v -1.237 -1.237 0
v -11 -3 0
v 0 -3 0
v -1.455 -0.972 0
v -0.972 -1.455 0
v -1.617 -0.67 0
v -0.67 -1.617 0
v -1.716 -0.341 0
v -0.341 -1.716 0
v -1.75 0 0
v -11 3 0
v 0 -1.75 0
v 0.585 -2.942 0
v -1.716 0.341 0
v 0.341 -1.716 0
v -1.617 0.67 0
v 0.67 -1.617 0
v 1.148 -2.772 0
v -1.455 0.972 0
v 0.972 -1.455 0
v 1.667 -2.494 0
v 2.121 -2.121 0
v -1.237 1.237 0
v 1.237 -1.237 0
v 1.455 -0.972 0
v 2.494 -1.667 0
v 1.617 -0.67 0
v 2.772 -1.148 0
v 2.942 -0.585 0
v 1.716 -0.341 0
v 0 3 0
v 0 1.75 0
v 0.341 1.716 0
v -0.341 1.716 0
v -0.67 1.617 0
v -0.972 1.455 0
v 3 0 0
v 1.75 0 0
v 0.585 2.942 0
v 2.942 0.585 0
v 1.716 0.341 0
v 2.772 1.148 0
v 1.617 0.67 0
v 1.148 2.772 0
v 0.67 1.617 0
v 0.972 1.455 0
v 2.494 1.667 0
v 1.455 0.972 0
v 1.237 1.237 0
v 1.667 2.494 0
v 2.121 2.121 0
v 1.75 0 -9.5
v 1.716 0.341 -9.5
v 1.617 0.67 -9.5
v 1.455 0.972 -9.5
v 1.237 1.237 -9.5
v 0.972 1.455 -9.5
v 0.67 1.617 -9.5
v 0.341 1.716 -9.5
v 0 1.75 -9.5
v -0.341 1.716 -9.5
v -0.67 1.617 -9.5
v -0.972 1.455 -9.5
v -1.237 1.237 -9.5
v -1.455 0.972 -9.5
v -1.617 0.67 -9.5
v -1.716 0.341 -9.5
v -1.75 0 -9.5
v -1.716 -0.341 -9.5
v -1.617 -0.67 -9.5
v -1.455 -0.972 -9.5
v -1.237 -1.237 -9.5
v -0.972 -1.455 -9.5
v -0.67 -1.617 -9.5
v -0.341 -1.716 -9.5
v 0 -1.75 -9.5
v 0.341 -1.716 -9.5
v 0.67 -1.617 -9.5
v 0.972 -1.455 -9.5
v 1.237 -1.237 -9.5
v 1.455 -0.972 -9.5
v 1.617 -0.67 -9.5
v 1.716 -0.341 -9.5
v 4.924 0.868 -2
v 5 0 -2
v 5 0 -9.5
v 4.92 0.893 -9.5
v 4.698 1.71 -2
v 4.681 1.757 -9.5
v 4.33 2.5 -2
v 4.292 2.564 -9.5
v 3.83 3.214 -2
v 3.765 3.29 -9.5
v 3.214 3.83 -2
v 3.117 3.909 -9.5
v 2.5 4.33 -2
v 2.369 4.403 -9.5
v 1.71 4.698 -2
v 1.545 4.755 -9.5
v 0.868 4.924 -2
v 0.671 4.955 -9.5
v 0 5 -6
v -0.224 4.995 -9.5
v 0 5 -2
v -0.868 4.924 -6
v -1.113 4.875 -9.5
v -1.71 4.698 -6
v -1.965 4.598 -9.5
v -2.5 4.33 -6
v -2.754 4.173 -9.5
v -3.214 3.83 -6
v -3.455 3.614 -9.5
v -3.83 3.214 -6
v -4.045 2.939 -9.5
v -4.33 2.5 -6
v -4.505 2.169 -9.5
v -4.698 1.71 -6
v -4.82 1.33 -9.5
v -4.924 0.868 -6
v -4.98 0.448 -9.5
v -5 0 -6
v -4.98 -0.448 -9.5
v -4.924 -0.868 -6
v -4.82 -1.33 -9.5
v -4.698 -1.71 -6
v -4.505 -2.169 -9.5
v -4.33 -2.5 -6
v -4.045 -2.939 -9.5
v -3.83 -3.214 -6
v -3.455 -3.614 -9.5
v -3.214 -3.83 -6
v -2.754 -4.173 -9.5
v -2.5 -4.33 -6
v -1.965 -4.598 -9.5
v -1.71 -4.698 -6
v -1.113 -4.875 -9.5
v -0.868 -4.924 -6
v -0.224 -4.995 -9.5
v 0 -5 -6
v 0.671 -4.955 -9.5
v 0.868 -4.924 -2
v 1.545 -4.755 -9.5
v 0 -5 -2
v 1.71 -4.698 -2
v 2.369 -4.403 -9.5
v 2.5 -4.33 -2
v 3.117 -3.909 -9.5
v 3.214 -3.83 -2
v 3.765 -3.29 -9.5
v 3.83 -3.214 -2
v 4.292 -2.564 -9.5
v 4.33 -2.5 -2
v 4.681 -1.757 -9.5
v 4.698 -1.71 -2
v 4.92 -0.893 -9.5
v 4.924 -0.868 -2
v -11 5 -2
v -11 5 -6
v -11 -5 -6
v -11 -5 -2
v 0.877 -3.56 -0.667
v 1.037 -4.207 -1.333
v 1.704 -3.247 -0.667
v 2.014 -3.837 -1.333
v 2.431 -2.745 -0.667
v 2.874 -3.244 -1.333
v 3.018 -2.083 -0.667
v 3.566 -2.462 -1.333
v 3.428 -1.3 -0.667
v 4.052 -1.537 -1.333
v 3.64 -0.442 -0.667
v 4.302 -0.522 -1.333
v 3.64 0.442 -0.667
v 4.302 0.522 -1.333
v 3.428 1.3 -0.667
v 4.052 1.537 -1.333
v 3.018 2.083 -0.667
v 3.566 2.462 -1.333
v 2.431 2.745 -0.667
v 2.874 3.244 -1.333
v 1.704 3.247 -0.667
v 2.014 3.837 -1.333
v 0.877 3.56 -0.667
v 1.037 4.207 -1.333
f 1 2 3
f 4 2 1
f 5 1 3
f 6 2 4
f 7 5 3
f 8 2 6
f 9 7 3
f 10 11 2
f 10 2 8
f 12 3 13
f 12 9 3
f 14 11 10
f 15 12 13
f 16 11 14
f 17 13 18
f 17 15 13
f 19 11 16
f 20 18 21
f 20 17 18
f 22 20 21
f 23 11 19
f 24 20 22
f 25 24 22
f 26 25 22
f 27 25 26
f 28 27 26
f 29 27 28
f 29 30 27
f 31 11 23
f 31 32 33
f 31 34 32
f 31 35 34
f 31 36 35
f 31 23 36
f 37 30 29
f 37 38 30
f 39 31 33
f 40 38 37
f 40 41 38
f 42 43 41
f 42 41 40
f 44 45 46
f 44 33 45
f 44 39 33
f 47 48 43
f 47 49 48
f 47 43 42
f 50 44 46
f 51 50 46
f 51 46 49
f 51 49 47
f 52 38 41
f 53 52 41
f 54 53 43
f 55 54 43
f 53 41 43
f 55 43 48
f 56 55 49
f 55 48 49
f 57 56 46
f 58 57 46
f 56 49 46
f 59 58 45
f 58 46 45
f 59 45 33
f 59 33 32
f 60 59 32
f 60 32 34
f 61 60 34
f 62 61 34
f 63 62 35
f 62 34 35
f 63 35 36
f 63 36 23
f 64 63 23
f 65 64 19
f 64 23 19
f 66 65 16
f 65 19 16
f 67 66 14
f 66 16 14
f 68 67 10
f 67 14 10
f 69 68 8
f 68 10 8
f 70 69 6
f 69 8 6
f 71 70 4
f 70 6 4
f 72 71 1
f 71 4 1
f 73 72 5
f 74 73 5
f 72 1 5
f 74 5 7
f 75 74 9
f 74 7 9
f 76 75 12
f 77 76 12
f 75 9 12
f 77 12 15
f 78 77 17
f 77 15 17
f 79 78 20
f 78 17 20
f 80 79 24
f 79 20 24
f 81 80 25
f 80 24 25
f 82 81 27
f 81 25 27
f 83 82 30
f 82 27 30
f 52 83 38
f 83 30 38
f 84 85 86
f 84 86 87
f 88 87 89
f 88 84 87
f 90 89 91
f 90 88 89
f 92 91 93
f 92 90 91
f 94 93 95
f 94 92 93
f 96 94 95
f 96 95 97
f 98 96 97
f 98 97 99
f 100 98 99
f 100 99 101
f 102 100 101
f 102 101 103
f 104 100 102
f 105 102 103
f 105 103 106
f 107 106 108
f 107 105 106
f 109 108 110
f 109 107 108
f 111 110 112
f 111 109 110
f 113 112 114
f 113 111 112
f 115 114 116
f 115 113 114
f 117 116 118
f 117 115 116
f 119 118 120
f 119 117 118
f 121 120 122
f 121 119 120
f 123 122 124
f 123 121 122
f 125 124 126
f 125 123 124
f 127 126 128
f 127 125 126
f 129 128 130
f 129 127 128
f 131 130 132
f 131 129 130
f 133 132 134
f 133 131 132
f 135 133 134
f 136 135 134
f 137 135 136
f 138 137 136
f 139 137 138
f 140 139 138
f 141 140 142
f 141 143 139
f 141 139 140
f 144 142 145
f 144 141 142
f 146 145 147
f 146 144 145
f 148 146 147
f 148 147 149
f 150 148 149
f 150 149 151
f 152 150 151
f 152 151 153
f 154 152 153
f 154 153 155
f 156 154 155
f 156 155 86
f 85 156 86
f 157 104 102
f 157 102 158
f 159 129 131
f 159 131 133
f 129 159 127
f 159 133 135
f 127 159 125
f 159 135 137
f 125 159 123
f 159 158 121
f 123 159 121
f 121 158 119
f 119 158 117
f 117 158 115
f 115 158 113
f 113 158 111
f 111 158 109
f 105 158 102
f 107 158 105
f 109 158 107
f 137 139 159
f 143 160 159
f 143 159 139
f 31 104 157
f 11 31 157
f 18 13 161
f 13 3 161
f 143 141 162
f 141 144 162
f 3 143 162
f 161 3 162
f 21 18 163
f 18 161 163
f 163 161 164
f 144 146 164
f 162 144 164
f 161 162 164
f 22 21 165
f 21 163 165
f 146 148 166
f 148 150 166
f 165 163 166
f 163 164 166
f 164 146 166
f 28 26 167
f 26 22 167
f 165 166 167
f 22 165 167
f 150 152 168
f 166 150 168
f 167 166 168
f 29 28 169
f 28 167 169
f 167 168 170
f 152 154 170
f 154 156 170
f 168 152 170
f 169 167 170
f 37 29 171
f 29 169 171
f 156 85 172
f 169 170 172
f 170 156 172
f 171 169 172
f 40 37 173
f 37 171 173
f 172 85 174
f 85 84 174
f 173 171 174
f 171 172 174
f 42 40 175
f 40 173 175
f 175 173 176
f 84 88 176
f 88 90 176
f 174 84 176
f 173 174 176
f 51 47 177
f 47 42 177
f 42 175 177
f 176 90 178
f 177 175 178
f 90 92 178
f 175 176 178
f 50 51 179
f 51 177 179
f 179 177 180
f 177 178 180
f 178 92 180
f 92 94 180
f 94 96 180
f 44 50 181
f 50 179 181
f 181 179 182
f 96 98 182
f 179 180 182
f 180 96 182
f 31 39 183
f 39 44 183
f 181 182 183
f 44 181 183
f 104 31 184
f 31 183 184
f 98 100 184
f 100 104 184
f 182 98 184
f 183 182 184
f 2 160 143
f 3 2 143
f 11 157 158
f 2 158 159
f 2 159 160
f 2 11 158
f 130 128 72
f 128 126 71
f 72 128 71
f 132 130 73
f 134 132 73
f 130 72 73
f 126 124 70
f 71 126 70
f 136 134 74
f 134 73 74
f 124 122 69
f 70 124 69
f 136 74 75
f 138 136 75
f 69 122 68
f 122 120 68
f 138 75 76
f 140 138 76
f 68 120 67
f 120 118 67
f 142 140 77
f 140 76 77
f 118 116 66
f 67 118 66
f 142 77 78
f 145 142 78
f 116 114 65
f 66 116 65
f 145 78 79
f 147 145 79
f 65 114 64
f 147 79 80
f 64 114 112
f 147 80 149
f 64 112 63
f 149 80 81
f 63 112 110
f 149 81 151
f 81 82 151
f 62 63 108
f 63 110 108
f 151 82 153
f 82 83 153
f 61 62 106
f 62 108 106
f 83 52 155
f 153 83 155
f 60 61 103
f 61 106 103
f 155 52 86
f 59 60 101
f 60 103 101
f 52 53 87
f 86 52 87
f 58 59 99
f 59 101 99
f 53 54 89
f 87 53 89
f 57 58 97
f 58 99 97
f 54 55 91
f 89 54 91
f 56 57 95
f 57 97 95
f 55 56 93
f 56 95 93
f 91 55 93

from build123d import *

# Parameters (mm, degrees)
F1_DEPTH = 6
F2_R     = 5
F2_R_2   = 1.75
F3_DEPTH = 9.5
F4_SIZE  = 2


with BuildPart() as f1:
    # F0 (on Top) → F1 (new body)
    with BuildSketch(Plane.XY):
        with BuildLine():
            ThreePointArc((0, -5), (-5, 0), (0, 5))
            Line((0, 5), (-11, 5))
            Line((-11, 5), (-11, -5))
            Line((-11, -5), (0, -5))
        make_face()
    extrude(amount=-F1_DEPTH)

    # F2 (on Top) → F3 (join)
    with BuildSketch(Plane.XY):
        Circle(F2_R)
        Circle(F2_R_2, mode=Mode.SUBTRACT)
    extrude(amount=-F3_DEPTH)

    # F4
    f4_edges = [f1.edges().sort_by_distance(p)[0] for p in [
        (-5.5, 5, 0),
    ]]
    chamfer(f4_edges, length=F4_SIZE)


solid = f1.part
